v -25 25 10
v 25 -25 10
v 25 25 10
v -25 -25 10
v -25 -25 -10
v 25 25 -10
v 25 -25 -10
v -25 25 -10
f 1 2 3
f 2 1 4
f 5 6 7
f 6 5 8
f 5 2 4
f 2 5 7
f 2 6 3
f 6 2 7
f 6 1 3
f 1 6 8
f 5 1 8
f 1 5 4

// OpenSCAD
// Parameters
body_length = 50; //[25:100:1]
body_width = 50; //[25:100:1]
body_height = 20; //[10:40:1]

// Main body module
module main_body() {
  color([0.85, 0.85, 0.8]) // Off-white color for 3D printed PLA
  translate([0, 0, 0]) // Centered at origin
  cube([body_length, body_width, body_height], center=true);
}

// Final model
union() {
  main_body();
}
